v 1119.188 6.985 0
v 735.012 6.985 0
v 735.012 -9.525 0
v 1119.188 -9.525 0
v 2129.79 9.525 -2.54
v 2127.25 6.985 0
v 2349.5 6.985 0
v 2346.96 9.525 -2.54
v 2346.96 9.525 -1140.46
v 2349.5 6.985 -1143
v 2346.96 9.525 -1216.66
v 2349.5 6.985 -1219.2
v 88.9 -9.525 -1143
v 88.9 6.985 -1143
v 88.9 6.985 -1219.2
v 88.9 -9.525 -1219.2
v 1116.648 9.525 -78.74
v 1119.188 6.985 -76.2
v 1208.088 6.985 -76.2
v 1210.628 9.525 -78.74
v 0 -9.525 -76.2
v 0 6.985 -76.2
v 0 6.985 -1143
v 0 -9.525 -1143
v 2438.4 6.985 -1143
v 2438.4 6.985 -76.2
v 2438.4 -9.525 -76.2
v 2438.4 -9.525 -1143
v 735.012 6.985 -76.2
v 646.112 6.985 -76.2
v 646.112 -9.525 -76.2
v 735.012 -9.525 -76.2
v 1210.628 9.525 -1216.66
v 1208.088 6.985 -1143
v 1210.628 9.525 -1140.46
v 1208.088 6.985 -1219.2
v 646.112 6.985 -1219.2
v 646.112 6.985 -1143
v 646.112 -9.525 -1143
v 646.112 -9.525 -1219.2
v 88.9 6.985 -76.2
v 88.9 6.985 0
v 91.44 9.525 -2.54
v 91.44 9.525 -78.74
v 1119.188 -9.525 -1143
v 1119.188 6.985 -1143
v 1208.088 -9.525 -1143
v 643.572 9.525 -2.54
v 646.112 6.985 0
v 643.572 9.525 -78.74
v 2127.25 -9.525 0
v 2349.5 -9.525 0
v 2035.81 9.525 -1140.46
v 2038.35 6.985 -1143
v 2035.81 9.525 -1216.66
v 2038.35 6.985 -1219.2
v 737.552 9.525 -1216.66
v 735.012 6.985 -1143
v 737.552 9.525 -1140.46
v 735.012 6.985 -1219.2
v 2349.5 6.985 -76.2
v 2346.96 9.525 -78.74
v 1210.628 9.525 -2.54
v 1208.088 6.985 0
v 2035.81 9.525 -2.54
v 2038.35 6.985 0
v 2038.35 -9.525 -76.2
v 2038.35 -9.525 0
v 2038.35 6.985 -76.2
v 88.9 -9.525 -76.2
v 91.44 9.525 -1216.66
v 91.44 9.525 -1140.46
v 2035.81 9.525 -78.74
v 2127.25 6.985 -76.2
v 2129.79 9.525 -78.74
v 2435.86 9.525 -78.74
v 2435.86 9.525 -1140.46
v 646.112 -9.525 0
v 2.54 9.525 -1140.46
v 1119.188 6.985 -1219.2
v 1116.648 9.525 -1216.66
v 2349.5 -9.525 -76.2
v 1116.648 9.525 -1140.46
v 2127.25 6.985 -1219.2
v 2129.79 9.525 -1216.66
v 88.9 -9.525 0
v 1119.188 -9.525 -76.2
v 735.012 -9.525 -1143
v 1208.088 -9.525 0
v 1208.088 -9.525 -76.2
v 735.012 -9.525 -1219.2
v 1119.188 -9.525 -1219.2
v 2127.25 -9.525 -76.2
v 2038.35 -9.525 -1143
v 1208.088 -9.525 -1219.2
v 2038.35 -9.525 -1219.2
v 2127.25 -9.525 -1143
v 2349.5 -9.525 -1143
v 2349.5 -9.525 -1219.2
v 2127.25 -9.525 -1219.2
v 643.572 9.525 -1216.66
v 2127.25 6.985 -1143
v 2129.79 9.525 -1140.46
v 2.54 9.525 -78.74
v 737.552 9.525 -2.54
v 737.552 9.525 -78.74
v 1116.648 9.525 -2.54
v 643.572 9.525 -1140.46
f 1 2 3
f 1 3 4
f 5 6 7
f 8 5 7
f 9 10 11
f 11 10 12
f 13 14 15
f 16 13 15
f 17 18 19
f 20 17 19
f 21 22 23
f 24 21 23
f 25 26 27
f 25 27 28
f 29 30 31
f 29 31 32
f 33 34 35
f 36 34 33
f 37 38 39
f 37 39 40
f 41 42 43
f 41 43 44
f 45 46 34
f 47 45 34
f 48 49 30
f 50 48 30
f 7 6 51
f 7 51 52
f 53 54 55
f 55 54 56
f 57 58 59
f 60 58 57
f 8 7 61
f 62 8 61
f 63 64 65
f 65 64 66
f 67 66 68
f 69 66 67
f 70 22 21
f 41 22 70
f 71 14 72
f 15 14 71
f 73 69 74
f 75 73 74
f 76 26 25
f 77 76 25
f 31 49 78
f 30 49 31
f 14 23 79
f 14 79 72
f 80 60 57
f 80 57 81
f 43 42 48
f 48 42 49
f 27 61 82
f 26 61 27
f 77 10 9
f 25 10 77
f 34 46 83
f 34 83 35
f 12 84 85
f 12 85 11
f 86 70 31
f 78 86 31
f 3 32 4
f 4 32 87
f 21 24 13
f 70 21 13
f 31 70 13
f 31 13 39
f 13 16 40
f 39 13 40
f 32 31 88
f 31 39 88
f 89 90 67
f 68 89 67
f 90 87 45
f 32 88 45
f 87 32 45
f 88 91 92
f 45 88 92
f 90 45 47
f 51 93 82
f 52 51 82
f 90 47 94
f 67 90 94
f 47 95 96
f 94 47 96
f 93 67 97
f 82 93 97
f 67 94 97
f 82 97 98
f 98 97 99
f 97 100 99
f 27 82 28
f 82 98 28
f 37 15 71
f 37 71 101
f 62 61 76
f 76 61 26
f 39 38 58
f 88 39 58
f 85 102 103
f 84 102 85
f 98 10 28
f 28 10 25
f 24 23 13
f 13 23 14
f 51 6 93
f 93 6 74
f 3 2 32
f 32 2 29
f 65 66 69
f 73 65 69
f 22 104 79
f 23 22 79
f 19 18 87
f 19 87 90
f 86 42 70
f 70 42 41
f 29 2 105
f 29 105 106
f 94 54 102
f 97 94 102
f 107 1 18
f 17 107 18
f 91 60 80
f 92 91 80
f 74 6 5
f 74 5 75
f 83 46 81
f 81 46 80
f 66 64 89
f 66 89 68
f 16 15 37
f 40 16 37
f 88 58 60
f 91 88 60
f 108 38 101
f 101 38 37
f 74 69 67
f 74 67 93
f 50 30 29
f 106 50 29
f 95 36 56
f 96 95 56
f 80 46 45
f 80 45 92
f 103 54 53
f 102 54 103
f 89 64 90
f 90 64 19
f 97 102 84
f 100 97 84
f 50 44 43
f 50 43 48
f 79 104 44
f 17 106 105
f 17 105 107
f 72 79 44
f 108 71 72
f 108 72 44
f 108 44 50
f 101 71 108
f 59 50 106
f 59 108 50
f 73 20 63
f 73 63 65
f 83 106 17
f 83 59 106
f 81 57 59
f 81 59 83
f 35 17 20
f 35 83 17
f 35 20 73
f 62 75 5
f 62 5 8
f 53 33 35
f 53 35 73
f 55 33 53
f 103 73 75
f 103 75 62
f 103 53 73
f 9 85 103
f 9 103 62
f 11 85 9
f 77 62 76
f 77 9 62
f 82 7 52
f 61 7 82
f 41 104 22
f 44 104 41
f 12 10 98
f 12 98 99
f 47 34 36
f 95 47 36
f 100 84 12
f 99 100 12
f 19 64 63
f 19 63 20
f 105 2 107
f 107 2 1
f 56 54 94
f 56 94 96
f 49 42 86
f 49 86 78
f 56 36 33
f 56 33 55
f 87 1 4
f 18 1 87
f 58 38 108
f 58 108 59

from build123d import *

# Parameters (mm, degrees)
SKETCH1_W           = 2438.4
SKETCH1_H           = 1219.2
BOSS_EXTRUDE1_DEPTH = 9.525
SKETCH2_W           = 88.9
SKETCH2_H           = 76.2
CUT_EXTRUDE1_DEPTH  = 20.05
CHAMFER1_SIZE       = 2.54


with BuildPart() as part:
    # Sketch1 → Boss-Extrude1 (new body, symmetric)
    with BuildSketch(Plane(origin=(0, 0, 0), x_dir=(1, 0, 0), z_dir=(0, 1, 0))):
        with Locations((1219.2, 609.6)):
            Rectangle(SKETCH1_W, SKETCH1_H)
    extrude(amount=BOSS_EXTRUDE1_DEPTH, both=True)

    # Sketch2 → Cut-Extrude1 (cut, through all)
    with BuildSketch(Plane(origin=(0, 9.525, 0), x_dir=(1, 0, 0), z_dir=(0, 1, 0))):
        with Locations((44.45, 1181.1)):
            Rectangle(SKETCH2_W, SKETCH2_H)
        with Locations((690.5625, 1181.1)):
            Rectangle(SKETCH2_W, SKETCH2_H)
        with Locations((1163.6375, 1181.1)):
            Rectangle(SKETCH2_W, SKETCH2_H)
        with Locations((2082.8, 1181.1)):
            Rectangle(SKETCH2_W, SKETCH2_H)
        with Locations((2393.95, 1181.1)):
            Rectangle(SKETCH2_W, SKETCH2_H)
        with Locations((1163.6375, 38.1)):
            Rectangle(SKETCH2_W, SKETCH2_H)
        with Locations((690.5625, 38.1)):
            Rectangle(SKETCH2_W, SKETCH2_H)
        with Locations((2393.95, 38.1)):
            Rectangle(SKETCH2_W, SKETCH2_H)
        with Locations((2082.8, 38.1)):
            Rectangle(SKETCH2_W, SKETCH2_H)
        with Locations((44.45, 38.1)):
            Rectangle(SKETCH2_W, SKETCH2_H)
    extrude(amount=-CUT_EXTRUDE1_DEPTH, mode=Mode.SUBTRACT)

    # Chamfer1
    chamfer1_edges = [part.edges().sort_by_distance(p)[0] for p in [
        (2038.35, 9.525, -1181.1),
        (2082.8, 9.525, -1143),
        (2127.25, 9.525, -1181.1),
        (1208.0875, 9.525, -1181.1),
        (1119.1875, 9.525, -1181.1),
        (1163.6375, 9.525, -1143),
        (646.1125, 9.525, -1181.1),
        (690.5625, 9.525, -1143),
        (735.0125, 9.525, -1181.1),
        (44.45, 9.525, -1143),
        (88.9, 9.525, -1181.1),
        (0, 9.525, -609.6),
        (367.50625, 9.525, 0),
        (927.1, 9.525, 0),
        (1623.21875, 9.525, 0),
        (2238.375, 9.525, 0),
        (2438.4, 9.525, -609.6),
        (2238.375, 9.525, -1219.2),
        (1623.21875, 9.525, -1219.2),
        (927.1, 9.525, -1219.2),
        (367.50625, 9.525, -1219.2),
        (88.9, 9.525, -38.1),
        (44.45, 9.525, -76.2),
        (2127.25, 9.525, -38.1),
        (2082.8, 9.525, -76.2),
        (2038.35, 9.525, -38.1),
        (2393.95, 9.525, -76.2),
        (2349.5, 9.525, -38.1),
        (735.0125, 9.525, -38.1),
        (690.5625, 9.525, -76.2),
        (646.1125, 9.525, -38.1),
        (1208.0875, 9.525, -38.1),
        (1163.6375, 9.525, -76.2),
        (1119.1875, 9.525, -38.1),
        (2349.5, 9.525, -1181.1),
        (2393.95, 9.525, -1143),
    ]]
    chamfer(chamfer1_edges, length=CHAMFER1_SIZE)


solid = part.part
